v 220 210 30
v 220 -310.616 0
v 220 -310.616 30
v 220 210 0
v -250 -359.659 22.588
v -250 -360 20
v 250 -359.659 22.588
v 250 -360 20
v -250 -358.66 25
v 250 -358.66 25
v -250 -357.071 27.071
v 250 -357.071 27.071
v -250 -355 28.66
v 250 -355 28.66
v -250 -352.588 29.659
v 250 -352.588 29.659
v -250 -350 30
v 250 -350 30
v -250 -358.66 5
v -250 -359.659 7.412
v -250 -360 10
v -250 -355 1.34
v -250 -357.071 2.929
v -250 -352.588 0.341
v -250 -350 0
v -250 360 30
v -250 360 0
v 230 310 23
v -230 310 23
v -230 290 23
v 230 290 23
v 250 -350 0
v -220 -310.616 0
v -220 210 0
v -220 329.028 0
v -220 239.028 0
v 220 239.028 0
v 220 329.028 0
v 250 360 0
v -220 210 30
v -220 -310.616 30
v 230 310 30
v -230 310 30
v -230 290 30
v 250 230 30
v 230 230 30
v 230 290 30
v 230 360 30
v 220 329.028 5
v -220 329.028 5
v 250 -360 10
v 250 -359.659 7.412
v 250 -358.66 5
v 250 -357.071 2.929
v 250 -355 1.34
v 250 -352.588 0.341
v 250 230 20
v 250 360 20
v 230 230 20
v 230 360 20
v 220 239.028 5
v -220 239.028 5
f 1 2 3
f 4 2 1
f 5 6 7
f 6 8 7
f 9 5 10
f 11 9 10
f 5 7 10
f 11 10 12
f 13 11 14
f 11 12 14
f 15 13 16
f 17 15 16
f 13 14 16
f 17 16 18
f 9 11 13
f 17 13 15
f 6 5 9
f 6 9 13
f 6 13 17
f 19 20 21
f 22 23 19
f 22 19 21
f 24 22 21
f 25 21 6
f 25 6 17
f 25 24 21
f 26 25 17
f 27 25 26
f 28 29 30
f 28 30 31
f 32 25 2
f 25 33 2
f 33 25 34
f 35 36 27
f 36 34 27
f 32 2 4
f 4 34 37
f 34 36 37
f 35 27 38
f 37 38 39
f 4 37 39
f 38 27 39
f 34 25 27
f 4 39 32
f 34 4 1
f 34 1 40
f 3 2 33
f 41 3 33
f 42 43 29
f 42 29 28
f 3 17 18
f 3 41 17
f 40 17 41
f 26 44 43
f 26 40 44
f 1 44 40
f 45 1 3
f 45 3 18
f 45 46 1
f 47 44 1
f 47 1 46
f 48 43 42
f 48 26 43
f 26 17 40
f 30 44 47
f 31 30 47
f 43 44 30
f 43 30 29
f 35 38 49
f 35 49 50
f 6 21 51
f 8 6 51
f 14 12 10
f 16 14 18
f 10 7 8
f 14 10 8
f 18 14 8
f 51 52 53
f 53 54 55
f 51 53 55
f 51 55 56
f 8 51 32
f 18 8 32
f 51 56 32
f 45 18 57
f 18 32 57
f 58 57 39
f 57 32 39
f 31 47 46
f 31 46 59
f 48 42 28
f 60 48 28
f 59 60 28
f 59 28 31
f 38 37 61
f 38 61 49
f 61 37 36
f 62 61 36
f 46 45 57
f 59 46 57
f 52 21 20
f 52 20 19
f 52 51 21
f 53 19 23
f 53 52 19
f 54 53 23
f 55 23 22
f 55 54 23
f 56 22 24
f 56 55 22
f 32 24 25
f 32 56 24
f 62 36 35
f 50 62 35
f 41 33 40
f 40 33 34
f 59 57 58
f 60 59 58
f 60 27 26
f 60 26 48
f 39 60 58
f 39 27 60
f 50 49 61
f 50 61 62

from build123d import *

# Parameters (mm, degrees)
CROQUIS2_W              = 500
CROQUIS2_H              = 720
SALIENTE_EXTRUIR1_DEPTH = 30
CROQUIS3_W              = 440
CROQUIS3_H              = 520.616152256
CORTAR_EXTRUIR1_DEPTH   = 440.31765273
REDONDEO1_R             = 10
REDONDEO2_R             = 10
CROQUIS4_W              = 440
CROQUIS4_H              = 90
CORTAR_EXTRUIR4_DEPTH   = 5
CROQUIS9_W              = 480
CROQUIS9_H              = 20
CORTAR_EXTRUIR6_DEPTH   = 7
CROQUIS10_W             = 10
CROQUIS10_H             = 130
CORTAR_EXTRUIR7_DEPTH   = 20


with BuildPart() as part:
    # Croquis2 → Saliente-Extruir1 (new body)
    with BuildSketch(Plane.XY):
        Rectangle(CROQUIS2_W, CROQUIS2_H)
    extrude(amount=SALIENTE_EXTRUIR1_DEPTH)

    # Croquis3 → Cortar-Extruir1 (cut, through all)
    with BuildSketch(Plane(origin=(0, 0, 0), x_dir=(-1, 0, 0), z_dir=(0, 0, -1))):
        with Locations((0, -50.308076128)):
            Rectangle(CROQUIS3_W, CROQUIS3_H)
    extrude(amount=-CORTAR_EXTRUIR1_DEPTH, mode=Mode.SUBTRACT)

    # Redondeo1
    redondeo1_edges = [part.edges().sort_by_distance(p)[0] for p in [
        (0, -360, 0),
    ]]
    fillet(redondeo1_edges, radius=REDONDEO1_R)

    # Redondeo2
    redondeo2_edges = [part.edges().sort_by_distance(p)[0] for p in [
        (0, -360, 30),
    ]]
    fillet(redondeo2_edges, radius=REDONDEO2_R)

    # Croquis4 → Cortar-Extruir4 (cut)
    with BuildSketch(Plane(origin=(0, 0, 0), x_dir=(-1, 0, 0), z_dir=(0, 0, -1))):
        with Locations((0, 284.028138346)):
            Rectangle(CROQUIS4_W, CROQUIS4_H)
    extrude(amount=-CORTAR_EXTRUIR4_DEPTH, mode=Mode.SUBTRACT)

    # Croquis9 → Cortar-Extruir6 (cut)
    with BuildSketch(Plane.XY.offset(30)):
        with Locations((10, 300)):
            Rectangle(CROQUIS9_W, CROQUIS9_H)
    extrude(amount=-CORTAR_EXTRUIR6_DEPTH, mode=Mode.SUBTRACT)

    # Croquis10 → Cortar-Extruir7 (cut)
    with BuildSketch(Plane(origin=(250, 0, 0), x_dir=(0, 0, -1), z_dir=(1, 0, 0))):
        with Locations((-25, 295)):
            Rectangle(CROQUIS10_W, CROQUIS10_H)
    extrude(amount=-CORTAR_EXTRUIR7_DEPTH, mode=Mode.SUBTRACT)


solid = part.part
